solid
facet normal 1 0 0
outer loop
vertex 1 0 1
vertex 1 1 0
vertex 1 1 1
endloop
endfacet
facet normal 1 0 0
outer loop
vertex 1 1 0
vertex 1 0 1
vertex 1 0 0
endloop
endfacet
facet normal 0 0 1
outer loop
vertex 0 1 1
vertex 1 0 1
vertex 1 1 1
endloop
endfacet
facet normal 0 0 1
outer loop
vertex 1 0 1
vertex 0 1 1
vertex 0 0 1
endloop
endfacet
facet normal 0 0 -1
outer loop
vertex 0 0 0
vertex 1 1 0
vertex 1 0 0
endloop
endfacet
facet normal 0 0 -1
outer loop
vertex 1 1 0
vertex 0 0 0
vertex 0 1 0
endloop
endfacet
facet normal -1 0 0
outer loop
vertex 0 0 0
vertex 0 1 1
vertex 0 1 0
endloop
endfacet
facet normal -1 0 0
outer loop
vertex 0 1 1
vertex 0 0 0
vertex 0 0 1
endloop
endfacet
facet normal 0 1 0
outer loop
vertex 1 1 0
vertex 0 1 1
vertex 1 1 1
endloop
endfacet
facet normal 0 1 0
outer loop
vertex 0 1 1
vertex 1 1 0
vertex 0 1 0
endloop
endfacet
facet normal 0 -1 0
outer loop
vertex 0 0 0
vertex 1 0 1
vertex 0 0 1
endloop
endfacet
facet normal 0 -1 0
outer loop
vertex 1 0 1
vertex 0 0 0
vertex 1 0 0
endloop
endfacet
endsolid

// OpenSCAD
translate(5) cube();
translate("a") cube();
translate([1, 2, 3, 4]) cube();
translate() cube();
